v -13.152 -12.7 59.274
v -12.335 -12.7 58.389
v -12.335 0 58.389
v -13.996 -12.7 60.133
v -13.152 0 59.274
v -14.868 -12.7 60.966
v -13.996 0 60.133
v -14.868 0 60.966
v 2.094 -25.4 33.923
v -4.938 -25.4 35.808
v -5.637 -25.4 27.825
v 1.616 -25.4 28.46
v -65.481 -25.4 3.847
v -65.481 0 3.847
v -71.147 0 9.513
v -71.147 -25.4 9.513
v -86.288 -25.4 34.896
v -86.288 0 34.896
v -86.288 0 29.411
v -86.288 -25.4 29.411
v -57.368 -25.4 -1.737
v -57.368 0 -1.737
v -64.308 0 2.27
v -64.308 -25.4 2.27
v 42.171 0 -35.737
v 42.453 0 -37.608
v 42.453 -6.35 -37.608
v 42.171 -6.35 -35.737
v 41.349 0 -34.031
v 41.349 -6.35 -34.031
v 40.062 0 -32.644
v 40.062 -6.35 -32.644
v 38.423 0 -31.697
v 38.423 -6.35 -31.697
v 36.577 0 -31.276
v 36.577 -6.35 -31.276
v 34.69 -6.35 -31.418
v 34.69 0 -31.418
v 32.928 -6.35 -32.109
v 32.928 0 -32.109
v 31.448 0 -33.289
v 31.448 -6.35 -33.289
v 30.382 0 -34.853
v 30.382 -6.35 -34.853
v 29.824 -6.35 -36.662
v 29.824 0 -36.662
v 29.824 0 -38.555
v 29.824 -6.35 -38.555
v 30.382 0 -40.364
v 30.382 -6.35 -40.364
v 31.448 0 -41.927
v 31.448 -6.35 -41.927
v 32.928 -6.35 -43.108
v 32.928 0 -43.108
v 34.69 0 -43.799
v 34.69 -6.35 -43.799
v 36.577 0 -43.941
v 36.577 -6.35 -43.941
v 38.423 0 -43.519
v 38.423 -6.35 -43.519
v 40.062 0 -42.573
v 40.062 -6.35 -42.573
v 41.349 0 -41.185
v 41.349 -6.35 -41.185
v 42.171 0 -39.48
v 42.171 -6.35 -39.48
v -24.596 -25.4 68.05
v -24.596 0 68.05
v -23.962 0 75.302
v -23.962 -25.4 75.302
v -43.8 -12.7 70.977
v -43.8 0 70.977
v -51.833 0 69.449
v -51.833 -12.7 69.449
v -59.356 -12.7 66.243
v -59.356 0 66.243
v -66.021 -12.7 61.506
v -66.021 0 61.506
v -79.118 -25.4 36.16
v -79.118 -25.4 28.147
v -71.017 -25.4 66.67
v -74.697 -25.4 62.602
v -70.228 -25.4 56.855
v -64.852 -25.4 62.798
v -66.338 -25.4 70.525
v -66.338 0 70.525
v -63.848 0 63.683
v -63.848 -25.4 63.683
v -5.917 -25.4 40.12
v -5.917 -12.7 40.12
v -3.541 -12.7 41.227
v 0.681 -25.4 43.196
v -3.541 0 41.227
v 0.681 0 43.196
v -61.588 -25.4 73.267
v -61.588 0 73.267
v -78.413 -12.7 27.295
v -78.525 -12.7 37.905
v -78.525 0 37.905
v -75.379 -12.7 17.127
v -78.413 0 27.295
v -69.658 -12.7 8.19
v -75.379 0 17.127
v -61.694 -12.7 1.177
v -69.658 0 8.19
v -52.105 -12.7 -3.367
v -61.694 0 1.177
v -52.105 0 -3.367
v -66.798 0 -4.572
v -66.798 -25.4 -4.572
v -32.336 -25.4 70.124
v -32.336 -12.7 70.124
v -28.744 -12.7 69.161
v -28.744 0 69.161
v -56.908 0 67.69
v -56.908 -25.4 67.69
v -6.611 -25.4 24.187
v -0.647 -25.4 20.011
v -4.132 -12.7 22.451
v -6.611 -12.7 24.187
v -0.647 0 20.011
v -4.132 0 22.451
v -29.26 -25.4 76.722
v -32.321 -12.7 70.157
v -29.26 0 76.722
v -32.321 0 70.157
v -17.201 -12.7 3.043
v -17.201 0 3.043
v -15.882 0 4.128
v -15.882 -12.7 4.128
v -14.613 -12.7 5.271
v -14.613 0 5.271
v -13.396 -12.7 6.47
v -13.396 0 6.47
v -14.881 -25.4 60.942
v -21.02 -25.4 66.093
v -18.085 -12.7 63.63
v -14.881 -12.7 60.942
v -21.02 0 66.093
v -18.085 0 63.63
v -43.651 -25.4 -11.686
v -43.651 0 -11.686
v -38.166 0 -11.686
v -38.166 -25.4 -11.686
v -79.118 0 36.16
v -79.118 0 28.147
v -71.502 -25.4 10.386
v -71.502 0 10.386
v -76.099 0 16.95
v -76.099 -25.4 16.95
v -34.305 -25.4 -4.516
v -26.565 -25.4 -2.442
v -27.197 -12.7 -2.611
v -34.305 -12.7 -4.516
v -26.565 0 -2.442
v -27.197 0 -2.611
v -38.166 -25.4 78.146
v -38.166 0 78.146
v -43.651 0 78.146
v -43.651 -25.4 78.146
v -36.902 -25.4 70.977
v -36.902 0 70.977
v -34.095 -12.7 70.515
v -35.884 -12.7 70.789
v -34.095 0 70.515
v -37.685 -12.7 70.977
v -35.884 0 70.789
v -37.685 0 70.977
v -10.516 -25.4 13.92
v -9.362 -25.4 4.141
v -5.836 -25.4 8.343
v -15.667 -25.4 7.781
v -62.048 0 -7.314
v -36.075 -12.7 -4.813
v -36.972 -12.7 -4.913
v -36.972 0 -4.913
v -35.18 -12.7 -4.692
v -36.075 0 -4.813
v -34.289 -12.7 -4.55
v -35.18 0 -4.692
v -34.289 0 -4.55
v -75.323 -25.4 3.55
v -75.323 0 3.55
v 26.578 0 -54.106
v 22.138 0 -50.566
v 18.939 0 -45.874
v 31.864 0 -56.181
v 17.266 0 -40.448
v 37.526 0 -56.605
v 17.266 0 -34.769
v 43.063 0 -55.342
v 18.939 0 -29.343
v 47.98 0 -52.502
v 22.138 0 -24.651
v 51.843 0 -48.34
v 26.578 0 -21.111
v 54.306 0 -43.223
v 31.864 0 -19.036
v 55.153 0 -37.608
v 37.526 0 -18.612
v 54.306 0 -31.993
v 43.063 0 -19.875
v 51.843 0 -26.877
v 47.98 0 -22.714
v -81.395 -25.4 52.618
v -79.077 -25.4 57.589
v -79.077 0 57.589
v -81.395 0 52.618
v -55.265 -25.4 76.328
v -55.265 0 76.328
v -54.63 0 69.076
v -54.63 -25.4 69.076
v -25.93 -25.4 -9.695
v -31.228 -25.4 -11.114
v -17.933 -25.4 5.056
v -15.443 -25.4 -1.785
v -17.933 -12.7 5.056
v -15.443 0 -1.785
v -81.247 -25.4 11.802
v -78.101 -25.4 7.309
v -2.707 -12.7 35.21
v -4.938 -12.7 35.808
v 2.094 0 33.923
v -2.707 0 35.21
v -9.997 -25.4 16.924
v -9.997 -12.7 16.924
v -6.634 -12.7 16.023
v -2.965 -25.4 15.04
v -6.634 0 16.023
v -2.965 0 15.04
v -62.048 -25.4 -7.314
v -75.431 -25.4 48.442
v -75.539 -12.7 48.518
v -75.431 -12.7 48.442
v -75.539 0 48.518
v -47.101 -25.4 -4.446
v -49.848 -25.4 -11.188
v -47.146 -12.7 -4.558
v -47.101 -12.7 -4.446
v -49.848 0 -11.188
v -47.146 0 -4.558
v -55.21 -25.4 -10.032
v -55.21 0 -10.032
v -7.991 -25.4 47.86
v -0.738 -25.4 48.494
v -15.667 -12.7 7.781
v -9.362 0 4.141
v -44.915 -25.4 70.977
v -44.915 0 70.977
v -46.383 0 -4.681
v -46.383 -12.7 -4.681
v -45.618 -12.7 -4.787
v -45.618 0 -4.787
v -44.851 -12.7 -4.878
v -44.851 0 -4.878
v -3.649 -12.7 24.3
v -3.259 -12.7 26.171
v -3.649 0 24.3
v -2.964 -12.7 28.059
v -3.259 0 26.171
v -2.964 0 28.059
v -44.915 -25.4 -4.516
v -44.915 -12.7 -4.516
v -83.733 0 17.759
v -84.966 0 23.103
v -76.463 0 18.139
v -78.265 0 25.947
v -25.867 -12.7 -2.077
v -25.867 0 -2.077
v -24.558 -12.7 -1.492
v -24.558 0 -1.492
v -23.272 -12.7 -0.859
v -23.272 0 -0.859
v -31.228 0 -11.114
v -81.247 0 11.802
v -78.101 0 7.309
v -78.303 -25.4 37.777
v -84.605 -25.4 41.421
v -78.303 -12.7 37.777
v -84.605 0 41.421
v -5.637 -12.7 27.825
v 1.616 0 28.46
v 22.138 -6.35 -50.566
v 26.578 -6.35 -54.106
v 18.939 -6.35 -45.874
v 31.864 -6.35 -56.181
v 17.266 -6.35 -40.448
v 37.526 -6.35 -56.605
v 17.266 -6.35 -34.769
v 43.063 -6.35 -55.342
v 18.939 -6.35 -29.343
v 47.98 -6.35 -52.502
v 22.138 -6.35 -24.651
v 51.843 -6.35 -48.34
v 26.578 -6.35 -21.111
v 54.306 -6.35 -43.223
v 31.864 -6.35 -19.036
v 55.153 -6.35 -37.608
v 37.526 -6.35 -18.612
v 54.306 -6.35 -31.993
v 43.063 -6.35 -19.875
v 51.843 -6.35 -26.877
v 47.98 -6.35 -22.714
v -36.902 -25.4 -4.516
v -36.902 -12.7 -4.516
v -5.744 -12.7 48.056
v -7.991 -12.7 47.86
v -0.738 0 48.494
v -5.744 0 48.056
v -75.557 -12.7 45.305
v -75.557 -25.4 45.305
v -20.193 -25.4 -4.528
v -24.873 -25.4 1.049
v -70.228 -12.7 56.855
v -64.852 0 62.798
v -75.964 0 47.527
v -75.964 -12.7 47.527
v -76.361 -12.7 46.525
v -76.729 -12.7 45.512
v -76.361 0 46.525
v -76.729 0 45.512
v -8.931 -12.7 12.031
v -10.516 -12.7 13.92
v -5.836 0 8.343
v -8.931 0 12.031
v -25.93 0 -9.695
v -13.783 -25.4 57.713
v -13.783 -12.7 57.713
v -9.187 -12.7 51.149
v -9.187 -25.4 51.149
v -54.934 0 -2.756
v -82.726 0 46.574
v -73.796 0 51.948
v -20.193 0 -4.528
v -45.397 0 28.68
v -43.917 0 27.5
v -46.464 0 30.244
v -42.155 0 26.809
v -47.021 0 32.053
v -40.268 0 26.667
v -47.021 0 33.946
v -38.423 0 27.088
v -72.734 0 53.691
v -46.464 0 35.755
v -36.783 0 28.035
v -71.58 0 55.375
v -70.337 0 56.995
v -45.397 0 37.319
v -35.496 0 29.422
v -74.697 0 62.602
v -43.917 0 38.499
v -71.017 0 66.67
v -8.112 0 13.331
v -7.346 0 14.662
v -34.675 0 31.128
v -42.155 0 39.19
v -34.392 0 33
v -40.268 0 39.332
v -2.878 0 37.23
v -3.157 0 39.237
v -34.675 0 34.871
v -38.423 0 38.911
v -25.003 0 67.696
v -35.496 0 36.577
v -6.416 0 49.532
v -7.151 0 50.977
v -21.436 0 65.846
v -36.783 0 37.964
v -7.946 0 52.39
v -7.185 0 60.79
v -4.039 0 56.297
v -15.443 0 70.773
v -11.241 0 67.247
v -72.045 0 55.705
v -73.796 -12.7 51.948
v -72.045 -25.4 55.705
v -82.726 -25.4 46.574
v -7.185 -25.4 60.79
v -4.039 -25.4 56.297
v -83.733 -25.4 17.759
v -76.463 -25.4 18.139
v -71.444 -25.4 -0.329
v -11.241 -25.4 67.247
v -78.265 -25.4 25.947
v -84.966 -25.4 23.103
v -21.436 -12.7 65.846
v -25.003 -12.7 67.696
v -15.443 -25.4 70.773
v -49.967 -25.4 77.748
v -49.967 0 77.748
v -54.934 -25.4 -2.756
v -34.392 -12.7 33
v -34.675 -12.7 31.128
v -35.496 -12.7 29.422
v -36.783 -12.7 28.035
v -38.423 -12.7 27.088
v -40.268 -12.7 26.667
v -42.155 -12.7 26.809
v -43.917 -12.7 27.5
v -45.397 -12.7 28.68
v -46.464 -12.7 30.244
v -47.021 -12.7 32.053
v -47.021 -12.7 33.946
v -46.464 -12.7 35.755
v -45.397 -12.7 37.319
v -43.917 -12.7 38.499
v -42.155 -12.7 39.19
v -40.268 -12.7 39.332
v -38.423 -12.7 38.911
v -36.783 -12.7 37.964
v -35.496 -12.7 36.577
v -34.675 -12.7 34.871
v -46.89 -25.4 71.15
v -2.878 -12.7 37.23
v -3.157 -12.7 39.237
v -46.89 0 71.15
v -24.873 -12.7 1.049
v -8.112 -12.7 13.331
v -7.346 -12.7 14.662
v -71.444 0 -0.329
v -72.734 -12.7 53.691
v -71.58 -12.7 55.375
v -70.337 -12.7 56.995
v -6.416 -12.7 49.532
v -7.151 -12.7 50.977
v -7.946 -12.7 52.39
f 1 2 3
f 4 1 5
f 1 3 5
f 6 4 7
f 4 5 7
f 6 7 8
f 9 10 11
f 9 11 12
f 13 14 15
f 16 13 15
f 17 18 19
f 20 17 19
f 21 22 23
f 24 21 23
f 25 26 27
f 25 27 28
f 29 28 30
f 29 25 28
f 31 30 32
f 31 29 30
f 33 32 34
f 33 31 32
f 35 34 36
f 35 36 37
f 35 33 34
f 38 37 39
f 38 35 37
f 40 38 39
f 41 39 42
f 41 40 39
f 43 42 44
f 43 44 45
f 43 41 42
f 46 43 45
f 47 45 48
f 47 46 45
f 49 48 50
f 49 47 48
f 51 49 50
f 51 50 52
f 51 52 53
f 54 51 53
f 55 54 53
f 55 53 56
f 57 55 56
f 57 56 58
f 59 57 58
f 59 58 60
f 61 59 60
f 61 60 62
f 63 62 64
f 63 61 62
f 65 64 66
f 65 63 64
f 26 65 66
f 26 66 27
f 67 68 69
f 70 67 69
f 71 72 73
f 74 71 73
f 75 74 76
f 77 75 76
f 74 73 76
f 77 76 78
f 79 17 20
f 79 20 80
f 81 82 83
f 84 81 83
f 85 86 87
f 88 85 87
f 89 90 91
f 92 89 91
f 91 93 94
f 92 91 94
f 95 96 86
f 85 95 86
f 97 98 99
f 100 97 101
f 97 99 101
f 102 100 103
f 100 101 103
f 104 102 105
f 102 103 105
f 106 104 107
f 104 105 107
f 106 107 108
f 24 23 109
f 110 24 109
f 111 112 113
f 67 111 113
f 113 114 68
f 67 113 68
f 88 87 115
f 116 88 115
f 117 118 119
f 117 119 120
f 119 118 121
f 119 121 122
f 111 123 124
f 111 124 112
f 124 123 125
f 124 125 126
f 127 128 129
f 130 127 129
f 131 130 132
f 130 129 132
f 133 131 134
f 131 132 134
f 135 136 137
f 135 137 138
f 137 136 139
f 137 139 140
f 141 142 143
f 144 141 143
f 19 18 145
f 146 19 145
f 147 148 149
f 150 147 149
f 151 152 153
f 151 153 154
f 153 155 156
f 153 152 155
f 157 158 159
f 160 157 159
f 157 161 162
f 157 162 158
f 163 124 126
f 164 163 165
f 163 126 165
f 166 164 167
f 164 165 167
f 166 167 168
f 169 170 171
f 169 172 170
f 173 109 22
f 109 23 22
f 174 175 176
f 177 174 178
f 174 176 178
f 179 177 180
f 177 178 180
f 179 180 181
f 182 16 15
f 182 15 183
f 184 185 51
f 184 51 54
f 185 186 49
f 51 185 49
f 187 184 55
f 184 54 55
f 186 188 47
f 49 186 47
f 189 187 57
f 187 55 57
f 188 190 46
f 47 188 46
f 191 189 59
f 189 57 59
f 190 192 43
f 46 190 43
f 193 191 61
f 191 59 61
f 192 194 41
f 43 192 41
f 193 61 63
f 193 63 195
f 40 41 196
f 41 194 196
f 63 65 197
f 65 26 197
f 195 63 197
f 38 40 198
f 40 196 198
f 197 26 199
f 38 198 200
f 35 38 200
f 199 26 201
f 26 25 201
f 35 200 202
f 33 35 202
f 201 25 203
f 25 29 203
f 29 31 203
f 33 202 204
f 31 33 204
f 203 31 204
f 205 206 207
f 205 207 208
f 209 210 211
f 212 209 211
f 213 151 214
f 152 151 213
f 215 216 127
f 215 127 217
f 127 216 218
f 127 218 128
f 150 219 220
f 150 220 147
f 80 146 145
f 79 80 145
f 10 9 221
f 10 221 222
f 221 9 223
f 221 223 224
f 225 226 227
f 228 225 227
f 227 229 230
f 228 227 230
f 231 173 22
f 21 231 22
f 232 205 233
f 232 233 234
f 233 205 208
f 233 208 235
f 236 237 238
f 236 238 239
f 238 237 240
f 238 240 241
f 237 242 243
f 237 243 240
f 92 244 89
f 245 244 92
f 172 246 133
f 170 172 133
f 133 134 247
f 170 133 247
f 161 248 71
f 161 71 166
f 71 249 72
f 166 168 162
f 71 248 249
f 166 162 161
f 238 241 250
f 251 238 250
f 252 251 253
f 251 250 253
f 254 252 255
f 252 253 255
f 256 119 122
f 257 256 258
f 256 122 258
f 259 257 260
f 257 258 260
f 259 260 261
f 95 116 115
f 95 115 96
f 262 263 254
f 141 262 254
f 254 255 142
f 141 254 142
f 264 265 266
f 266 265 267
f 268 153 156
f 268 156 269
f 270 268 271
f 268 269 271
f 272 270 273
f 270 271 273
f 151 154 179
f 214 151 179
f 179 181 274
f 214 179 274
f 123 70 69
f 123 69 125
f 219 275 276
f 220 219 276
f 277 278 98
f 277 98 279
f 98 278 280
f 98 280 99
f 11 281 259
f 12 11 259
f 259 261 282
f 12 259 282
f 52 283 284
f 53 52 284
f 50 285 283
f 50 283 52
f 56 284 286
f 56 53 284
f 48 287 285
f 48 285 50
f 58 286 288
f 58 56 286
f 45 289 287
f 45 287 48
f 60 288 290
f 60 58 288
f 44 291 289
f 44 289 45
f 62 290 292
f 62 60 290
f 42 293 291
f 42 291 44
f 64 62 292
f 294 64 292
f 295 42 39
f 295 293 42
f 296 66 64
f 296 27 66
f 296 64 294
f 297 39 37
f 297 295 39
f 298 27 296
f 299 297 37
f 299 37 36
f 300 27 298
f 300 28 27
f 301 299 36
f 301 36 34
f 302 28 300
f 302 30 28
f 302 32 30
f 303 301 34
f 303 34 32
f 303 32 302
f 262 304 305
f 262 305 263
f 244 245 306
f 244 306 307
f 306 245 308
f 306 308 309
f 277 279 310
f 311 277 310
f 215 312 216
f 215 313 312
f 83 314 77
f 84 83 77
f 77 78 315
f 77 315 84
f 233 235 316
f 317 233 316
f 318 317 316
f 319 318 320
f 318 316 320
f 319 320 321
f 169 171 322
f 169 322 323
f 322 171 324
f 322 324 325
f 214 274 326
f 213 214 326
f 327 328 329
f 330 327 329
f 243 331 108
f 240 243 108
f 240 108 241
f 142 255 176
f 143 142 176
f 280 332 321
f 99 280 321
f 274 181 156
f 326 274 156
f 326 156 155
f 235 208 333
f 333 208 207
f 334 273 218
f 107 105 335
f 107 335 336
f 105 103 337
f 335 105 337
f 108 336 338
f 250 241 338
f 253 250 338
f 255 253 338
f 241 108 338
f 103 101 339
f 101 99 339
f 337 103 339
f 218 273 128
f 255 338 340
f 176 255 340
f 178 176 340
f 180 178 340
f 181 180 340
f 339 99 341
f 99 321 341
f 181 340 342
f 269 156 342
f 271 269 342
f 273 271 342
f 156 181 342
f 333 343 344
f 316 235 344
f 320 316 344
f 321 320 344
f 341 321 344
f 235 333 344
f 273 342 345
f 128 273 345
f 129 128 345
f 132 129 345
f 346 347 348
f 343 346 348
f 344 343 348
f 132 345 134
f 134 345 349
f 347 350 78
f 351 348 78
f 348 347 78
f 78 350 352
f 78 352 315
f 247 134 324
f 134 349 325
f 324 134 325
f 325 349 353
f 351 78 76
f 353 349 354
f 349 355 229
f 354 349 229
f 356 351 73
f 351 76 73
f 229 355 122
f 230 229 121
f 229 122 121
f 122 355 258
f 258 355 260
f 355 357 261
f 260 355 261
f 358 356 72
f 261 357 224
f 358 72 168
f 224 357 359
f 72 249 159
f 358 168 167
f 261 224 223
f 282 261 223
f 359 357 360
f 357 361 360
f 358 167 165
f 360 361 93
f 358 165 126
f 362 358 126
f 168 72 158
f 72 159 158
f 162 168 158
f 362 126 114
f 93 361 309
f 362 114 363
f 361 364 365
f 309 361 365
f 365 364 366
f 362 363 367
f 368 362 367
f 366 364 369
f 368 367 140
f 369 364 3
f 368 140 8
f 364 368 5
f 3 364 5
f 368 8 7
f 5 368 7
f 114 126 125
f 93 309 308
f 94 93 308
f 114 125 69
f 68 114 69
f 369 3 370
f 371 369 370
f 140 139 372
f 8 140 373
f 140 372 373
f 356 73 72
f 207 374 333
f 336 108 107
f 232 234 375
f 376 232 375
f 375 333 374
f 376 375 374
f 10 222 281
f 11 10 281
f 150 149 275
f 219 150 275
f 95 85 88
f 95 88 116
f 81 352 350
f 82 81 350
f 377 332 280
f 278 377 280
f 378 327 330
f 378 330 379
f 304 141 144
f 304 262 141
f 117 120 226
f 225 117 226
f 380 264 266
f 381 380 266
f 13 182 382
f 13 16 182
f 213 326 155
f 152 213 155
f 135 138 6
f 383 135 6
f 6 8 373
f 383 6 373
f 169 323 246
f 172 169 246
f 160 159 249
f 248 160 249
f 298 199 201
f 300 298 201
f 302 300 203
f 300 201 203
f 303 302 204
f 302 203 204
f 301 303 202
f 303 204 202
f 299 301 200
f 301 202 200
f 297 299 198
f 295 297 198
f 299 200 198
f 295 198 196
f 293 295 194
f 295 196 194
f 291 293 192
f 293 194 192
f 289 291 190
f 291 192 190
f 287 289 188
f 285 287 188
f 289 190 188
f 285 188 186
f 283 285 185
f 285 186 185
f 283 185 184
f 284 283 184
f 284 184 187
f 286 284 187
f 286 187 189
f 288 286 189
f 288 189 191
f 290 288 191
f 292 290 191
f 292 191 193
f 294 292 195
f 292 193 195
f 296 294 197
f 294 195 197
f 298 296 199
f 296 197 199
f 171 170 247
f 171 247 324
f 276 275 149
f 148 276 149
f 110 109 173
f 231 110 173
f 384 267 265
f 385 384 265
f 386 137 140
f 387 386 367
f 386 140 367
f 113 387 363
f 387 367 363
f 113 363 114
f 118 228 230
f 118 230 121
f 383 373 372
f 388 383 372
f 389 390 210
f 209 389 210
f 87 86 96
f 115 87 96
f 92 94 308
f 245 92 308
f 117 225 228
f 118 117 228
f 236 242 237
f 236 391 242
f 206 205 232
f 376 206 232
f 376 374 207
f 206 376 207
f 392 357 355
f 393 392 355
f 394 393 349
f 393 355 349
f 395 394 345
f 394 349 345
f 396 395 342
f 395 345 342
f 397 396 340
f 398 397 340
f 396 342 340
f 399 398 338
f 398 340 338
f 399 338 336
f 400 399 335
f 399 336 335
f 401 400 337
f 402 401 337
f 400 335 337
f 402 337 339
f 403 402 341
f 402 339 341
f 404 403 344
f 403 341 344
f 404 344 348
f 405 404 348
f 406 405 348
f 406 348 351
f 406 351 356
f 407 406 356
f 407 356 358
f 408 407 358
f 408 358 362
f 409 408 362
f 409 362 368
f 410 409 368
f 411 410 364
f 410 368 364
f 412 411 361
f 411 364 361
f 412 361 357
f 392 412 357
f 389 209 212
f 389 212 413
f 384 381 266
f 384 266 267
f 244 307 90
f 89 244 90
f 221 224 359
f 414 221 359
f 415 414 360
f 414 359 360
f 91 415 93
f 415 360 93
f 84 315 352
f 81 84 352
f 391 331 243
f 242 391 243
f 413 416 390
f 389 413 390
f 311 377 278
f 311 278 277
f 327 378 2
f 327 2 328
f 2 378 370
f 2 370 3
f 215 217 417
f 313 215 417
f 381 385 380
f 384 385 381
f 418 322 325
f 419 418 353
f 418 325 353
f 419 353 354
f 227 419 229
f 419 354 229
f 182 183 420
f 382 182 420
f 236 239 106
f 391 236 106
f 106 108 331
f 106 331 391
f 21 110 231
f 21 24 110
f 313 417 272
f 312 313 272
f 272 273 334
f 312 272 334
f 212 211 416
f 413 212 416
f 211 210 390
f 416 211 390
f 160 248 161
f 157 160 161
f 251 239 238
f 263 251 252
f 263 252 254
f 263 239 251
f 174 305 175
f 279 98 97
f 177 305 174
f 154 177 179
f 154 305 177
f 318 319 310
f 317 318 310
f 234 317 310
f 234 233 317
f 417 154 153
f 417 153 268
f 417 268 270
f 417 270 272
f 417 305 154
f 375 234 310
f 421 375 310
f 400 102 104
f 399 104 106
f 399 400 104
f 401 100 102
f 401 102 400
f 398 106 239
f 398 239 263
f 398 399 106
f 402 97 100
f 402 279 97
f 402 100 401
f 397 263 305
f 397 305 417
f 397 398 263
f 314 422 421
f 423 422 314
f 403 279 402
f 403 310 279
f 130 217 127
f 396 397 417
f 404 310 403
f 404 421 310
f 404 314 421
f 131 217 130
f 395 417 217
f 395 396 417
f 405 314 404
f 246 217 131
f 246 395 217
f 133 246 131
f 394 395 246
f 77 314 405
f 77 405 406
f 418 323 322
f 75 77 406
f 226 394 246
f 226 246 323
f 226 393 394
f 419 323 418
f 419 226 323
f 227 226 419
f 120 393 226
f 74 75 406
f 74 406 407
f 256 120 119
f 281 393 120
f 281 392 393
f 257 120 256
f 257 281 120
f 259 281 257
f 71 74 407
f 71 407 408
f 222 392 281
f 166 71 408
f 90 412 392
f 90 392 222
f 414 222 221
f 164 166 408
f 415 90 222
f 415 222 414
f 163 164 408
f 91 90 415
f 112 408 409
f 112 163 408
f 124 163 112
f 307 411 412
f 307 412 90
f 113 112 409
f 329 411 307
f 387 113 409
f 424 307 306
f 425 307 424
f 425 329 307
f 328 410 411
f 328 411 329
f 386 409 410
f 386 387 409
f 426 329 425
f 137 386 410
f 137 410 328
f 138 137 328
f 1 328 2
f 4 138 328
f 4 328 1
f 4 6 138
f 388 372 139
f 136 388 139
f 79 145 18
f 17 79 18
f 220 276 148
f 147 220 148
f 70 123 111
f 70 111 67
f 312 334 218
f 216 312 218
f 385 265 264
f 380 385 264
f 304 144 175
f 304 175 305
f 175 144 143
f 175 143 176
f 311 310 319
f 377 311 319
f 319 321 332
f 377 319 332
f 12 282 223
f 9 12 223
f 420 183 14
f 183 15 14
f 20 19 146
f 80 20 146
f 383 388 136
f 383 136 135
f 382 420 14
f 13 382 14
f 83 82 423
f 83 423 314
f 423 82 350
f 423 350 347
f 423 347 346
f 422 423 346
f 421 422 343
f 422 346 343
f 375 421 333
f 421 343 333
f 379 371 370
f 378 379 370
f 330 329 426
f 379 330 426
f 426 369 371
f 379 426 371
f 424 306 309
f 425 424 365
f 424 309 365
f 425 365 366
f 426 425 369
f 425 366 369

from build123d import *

# Parameters (mm, degrees)
F1_DEPTH = 12.7
F2_R     = 19.05
F2_R_2   = 6.35
F3_DEPTH = 6.35
F5_DEPTH = 25.4


with BuildPart() as f1:
    # F0 (on Front) → F1 (new body)
    with BuildSketch(Plane.XZ):
        with BuildLine():
            ThreePointArc((-47.0924196601, 32.9995155334), (-40.7424196601, 39.3495155334), (-34.3924196601, 32.9995155334))
            Line((-34.3924196601, 32.9995155334), (-2.6424196601, 32.9995155334))
            ThreePointArc((-2.6424196601, 32.9995155334), (-40.7424196601, 71.0995155334), (-78.8424196601, 32.9995155334))
            Line((-78.8424196601, 32.9995155334), (-47.0924196601, 32.9995155334))
        make_face()
        with BuildLine():
            Line((-2.6424196601, 32.9995155334), (-34.3924196601, 32.9995155334))
            ThreePointArc((-34.3924196601, 32.9995155334), (-40.7424196601, 26.6495155334), (-47.0924196601, 32.9995155334))
            Line((-47.0924196601, 32.9995155334), (-78.8424196601, 32.9995155334))
            ThreePointArc((-78.8424196601, 32.9995155334), (-40.7424196601, -5.1004844666), (-2.6424196601, 32.9995155334))
        make_face()
    extrude(amount=F1_DEPTH)

    # F4 (on Front) → F5, piece 8 (join)
    with BuildSketch(Plane.XZ):
        Polygon((-38.1659068628, 78.1463310122), (-43.650681225, 78.1463310122), (-44.9148942967, 70.9766224027), (-36.9016937912, 70.9766224027), align=None)
        Polygon((-23.9616667882, 75.3021488025), (-29.2595519959, 76.7217128655), (-32.3363451878, 70.1235085726), (-24.5961878683, 68.0495396695), align=None)
        Polygon((-11.2410145817, 67.2470508706), (-15.4425955036, 70.7725958725), (-21.0196387614, 66.0929009318), (-14.8811710425, 60.9421149329), align=None)
        Polygon((-4.0393144459, 56.2968192684), (-7.1852517787, 60.7896833996), (-13.7834560717, 57.7128902078), (-9.187273082, 51.1488606324), align=None)
        Polygon((0.6811337856, 43.1964908686), (-0.7384302774, 48.4943760763), (-7.9910394104, 47.8598549962), (-5.9170705074, 40.1196976767), align=None)
        Polygon((1.6159048783, 28.4595568903), (2.0939344616, 33.9234600301), (-4.9383078128, 35.8077436686), (-5.6367042547, 27.8250358102), align=None)
        Polygon((-2.9652025274, 15.0399360099), (-0.6472367204, 20.0108297245), (-6.6109199333, 24.1866456656), (-9.9974448019, 16.9242196483), align=None)
        Polygon((-9.3617214584, 4.1410547296), (-5.8361764565, 8.3426356515), (-10.5158713972, 13.9196789093), (-15.6666573961, 7.7812111904), align=None)
        Polygon((-20.193195102, -4.5277704628), (-15.4432411704, -1.7853832818), (-17.9332548393, 5.0558730477), (-24.8728900427, 1.049272795), align=None)
        Polygon((-31.2282322947, -11.1141224071), (-25.9303470869, -9.694558344), (-26.564868167, -2.4419492111), (-34.3050254866, -4.5159181141), align=None)
        Polygon((-43.650681225, -11.6856267237), (-38.1659068628, -11.6856267237), (-36.9016937912, -4.5159181141), (-44.9148942967, -4.5159181141), align=None)
        Polygon((-55.2098710533, -10.031535999), (-49.8484395557, -11.1881699516), (-47.1007020564, -4.4462937386), (-54.93369987, -2.756463098), align=None)
        Polygon((-82.7261356414, 46.5736751104), (-84.6054236202, 41.4209062919), (-78.3028798417, 37.7766096304), (-75.5572588941, 45.3047533561), align=None)
        Polygon((-71.0174292326, 66.6698515415), (-74.6968947013, 62.6023850489), (-70.2279923235, 56.855049338), (-64.8523300615, 62.7975772165), align=None)
        Polygon((-79.0767520666, 57.589199394), (-81.3947178736, 52.6183056794), (-75.4310346608, 48.4424897383), (-72.0445097921, 55.7049157556), align=None)
    extrude(amount=F5_DEPTH)


with BuildPart() as f3:
    # F2 (on Front) → F3 (new body)
    with BuildSketch(Plane.XZ):
        with Locations((36.1028239131, -37.6083850861)):
            Circle(F2_R)
        with Locations((36.1028239131, -37.6083850861)):
            Circle(F2_R_2, mode=Mode.SUBTRACT)
    extrude(amount=F3_DEPTH)


with BuildPart() as f5:
    # F4 (on Front) → F5 (new body)
    with BuildSketch(Plane.XZ):
        Polygon((-66.7979119475, -4.5715123415), (-62.0479580159, -7.3138995226), (-57.3682630752, -1.7368562648), (-64.3078982786, 2.269743988), align=None)
    extrude(amount=F5_DEPTH)


with BuildPart() as f5b:
    # F4 (on Front) → F5, piece 2 (new body)
    with BuildSketch(Plane.XZ):
        Polygon((-75.3225982189, 3.5497164354), (-71.4442770742, -0.3286047094), (-65.4805938613, 3.8472112317), (-71.1467822778, 9.5133996482), align=None)
    extrude(amount=F5_DEPTH)


with BuildPart() as f5c:
    # F4 (on Front) → F5, piece 3 (new body)
    with BuildSketch(Plane.XZ):
        Polygon((-81.2465018022, 11.8023036048), (-78.1005644693, 7.3094394736), (-71.5023601764, 10.3862326654), (-76.0985431661, 16.9502622408), align=None)
    extrude(amount=F5_DEPTH)


with BuildPart() as f5d:
    # F4 (on Front) → F5, piece 4 (new body)
    with BuildSketch(Plane.XZ):
        Polygon((-84.9664509296, 23.1028068811), (-83.7330315748, 17.7585177329), (-76.4626685378, 18.1390141818), (-78.2646818834, 25.9469671943), align=None)
    extrude(amount=F5_DEPTH)


with BuildPart() as f5e:
    # F4 (on Front) → F5, piece 5 (new body)
    with BuildSketch(Plane.XZ):
        Polygon((-86.287654041, 34.8960010465), (-86.287654041, 29.4112266843), (-79.1179454314, 28.1470136126), (-79.1179454314, 36.1602141181), align=None)
    extrude(amount=F5_DEPTH)


with BuildPart() as f5f:
    # F4 (on Front) → F5, piece 6 (new body)
    with BuildSketch(Plane.XZ):
        Polygon((-49.9666237613, 77.7480527759), (-55.2645089691, 76.3284887128), (-54.6299878889, 69.0758795799), (-46.8898305694, 71.1498484829), align=None)
    extrude(amount=F5_DEPTH)


with BuildPart() as f5g:
    # F4 (on Front) → F5, piece 7 (new body)
    with BuildSketch(Plane.XZ):
        Polygon((-61.5880899131, 73.2670277357), (-66.3380438448, 70.5246405546), (-63.8480301759, 63.6833842252), (-56.9083949725, 67.6899844779), align=None)
    extrude(amount=F5_DEPTH)


solid = Compound([f1.part, f3.part, f5.part, f5b.part, f5c.part, f5d.part, f5e.part, f5f.part, f5g.part])
